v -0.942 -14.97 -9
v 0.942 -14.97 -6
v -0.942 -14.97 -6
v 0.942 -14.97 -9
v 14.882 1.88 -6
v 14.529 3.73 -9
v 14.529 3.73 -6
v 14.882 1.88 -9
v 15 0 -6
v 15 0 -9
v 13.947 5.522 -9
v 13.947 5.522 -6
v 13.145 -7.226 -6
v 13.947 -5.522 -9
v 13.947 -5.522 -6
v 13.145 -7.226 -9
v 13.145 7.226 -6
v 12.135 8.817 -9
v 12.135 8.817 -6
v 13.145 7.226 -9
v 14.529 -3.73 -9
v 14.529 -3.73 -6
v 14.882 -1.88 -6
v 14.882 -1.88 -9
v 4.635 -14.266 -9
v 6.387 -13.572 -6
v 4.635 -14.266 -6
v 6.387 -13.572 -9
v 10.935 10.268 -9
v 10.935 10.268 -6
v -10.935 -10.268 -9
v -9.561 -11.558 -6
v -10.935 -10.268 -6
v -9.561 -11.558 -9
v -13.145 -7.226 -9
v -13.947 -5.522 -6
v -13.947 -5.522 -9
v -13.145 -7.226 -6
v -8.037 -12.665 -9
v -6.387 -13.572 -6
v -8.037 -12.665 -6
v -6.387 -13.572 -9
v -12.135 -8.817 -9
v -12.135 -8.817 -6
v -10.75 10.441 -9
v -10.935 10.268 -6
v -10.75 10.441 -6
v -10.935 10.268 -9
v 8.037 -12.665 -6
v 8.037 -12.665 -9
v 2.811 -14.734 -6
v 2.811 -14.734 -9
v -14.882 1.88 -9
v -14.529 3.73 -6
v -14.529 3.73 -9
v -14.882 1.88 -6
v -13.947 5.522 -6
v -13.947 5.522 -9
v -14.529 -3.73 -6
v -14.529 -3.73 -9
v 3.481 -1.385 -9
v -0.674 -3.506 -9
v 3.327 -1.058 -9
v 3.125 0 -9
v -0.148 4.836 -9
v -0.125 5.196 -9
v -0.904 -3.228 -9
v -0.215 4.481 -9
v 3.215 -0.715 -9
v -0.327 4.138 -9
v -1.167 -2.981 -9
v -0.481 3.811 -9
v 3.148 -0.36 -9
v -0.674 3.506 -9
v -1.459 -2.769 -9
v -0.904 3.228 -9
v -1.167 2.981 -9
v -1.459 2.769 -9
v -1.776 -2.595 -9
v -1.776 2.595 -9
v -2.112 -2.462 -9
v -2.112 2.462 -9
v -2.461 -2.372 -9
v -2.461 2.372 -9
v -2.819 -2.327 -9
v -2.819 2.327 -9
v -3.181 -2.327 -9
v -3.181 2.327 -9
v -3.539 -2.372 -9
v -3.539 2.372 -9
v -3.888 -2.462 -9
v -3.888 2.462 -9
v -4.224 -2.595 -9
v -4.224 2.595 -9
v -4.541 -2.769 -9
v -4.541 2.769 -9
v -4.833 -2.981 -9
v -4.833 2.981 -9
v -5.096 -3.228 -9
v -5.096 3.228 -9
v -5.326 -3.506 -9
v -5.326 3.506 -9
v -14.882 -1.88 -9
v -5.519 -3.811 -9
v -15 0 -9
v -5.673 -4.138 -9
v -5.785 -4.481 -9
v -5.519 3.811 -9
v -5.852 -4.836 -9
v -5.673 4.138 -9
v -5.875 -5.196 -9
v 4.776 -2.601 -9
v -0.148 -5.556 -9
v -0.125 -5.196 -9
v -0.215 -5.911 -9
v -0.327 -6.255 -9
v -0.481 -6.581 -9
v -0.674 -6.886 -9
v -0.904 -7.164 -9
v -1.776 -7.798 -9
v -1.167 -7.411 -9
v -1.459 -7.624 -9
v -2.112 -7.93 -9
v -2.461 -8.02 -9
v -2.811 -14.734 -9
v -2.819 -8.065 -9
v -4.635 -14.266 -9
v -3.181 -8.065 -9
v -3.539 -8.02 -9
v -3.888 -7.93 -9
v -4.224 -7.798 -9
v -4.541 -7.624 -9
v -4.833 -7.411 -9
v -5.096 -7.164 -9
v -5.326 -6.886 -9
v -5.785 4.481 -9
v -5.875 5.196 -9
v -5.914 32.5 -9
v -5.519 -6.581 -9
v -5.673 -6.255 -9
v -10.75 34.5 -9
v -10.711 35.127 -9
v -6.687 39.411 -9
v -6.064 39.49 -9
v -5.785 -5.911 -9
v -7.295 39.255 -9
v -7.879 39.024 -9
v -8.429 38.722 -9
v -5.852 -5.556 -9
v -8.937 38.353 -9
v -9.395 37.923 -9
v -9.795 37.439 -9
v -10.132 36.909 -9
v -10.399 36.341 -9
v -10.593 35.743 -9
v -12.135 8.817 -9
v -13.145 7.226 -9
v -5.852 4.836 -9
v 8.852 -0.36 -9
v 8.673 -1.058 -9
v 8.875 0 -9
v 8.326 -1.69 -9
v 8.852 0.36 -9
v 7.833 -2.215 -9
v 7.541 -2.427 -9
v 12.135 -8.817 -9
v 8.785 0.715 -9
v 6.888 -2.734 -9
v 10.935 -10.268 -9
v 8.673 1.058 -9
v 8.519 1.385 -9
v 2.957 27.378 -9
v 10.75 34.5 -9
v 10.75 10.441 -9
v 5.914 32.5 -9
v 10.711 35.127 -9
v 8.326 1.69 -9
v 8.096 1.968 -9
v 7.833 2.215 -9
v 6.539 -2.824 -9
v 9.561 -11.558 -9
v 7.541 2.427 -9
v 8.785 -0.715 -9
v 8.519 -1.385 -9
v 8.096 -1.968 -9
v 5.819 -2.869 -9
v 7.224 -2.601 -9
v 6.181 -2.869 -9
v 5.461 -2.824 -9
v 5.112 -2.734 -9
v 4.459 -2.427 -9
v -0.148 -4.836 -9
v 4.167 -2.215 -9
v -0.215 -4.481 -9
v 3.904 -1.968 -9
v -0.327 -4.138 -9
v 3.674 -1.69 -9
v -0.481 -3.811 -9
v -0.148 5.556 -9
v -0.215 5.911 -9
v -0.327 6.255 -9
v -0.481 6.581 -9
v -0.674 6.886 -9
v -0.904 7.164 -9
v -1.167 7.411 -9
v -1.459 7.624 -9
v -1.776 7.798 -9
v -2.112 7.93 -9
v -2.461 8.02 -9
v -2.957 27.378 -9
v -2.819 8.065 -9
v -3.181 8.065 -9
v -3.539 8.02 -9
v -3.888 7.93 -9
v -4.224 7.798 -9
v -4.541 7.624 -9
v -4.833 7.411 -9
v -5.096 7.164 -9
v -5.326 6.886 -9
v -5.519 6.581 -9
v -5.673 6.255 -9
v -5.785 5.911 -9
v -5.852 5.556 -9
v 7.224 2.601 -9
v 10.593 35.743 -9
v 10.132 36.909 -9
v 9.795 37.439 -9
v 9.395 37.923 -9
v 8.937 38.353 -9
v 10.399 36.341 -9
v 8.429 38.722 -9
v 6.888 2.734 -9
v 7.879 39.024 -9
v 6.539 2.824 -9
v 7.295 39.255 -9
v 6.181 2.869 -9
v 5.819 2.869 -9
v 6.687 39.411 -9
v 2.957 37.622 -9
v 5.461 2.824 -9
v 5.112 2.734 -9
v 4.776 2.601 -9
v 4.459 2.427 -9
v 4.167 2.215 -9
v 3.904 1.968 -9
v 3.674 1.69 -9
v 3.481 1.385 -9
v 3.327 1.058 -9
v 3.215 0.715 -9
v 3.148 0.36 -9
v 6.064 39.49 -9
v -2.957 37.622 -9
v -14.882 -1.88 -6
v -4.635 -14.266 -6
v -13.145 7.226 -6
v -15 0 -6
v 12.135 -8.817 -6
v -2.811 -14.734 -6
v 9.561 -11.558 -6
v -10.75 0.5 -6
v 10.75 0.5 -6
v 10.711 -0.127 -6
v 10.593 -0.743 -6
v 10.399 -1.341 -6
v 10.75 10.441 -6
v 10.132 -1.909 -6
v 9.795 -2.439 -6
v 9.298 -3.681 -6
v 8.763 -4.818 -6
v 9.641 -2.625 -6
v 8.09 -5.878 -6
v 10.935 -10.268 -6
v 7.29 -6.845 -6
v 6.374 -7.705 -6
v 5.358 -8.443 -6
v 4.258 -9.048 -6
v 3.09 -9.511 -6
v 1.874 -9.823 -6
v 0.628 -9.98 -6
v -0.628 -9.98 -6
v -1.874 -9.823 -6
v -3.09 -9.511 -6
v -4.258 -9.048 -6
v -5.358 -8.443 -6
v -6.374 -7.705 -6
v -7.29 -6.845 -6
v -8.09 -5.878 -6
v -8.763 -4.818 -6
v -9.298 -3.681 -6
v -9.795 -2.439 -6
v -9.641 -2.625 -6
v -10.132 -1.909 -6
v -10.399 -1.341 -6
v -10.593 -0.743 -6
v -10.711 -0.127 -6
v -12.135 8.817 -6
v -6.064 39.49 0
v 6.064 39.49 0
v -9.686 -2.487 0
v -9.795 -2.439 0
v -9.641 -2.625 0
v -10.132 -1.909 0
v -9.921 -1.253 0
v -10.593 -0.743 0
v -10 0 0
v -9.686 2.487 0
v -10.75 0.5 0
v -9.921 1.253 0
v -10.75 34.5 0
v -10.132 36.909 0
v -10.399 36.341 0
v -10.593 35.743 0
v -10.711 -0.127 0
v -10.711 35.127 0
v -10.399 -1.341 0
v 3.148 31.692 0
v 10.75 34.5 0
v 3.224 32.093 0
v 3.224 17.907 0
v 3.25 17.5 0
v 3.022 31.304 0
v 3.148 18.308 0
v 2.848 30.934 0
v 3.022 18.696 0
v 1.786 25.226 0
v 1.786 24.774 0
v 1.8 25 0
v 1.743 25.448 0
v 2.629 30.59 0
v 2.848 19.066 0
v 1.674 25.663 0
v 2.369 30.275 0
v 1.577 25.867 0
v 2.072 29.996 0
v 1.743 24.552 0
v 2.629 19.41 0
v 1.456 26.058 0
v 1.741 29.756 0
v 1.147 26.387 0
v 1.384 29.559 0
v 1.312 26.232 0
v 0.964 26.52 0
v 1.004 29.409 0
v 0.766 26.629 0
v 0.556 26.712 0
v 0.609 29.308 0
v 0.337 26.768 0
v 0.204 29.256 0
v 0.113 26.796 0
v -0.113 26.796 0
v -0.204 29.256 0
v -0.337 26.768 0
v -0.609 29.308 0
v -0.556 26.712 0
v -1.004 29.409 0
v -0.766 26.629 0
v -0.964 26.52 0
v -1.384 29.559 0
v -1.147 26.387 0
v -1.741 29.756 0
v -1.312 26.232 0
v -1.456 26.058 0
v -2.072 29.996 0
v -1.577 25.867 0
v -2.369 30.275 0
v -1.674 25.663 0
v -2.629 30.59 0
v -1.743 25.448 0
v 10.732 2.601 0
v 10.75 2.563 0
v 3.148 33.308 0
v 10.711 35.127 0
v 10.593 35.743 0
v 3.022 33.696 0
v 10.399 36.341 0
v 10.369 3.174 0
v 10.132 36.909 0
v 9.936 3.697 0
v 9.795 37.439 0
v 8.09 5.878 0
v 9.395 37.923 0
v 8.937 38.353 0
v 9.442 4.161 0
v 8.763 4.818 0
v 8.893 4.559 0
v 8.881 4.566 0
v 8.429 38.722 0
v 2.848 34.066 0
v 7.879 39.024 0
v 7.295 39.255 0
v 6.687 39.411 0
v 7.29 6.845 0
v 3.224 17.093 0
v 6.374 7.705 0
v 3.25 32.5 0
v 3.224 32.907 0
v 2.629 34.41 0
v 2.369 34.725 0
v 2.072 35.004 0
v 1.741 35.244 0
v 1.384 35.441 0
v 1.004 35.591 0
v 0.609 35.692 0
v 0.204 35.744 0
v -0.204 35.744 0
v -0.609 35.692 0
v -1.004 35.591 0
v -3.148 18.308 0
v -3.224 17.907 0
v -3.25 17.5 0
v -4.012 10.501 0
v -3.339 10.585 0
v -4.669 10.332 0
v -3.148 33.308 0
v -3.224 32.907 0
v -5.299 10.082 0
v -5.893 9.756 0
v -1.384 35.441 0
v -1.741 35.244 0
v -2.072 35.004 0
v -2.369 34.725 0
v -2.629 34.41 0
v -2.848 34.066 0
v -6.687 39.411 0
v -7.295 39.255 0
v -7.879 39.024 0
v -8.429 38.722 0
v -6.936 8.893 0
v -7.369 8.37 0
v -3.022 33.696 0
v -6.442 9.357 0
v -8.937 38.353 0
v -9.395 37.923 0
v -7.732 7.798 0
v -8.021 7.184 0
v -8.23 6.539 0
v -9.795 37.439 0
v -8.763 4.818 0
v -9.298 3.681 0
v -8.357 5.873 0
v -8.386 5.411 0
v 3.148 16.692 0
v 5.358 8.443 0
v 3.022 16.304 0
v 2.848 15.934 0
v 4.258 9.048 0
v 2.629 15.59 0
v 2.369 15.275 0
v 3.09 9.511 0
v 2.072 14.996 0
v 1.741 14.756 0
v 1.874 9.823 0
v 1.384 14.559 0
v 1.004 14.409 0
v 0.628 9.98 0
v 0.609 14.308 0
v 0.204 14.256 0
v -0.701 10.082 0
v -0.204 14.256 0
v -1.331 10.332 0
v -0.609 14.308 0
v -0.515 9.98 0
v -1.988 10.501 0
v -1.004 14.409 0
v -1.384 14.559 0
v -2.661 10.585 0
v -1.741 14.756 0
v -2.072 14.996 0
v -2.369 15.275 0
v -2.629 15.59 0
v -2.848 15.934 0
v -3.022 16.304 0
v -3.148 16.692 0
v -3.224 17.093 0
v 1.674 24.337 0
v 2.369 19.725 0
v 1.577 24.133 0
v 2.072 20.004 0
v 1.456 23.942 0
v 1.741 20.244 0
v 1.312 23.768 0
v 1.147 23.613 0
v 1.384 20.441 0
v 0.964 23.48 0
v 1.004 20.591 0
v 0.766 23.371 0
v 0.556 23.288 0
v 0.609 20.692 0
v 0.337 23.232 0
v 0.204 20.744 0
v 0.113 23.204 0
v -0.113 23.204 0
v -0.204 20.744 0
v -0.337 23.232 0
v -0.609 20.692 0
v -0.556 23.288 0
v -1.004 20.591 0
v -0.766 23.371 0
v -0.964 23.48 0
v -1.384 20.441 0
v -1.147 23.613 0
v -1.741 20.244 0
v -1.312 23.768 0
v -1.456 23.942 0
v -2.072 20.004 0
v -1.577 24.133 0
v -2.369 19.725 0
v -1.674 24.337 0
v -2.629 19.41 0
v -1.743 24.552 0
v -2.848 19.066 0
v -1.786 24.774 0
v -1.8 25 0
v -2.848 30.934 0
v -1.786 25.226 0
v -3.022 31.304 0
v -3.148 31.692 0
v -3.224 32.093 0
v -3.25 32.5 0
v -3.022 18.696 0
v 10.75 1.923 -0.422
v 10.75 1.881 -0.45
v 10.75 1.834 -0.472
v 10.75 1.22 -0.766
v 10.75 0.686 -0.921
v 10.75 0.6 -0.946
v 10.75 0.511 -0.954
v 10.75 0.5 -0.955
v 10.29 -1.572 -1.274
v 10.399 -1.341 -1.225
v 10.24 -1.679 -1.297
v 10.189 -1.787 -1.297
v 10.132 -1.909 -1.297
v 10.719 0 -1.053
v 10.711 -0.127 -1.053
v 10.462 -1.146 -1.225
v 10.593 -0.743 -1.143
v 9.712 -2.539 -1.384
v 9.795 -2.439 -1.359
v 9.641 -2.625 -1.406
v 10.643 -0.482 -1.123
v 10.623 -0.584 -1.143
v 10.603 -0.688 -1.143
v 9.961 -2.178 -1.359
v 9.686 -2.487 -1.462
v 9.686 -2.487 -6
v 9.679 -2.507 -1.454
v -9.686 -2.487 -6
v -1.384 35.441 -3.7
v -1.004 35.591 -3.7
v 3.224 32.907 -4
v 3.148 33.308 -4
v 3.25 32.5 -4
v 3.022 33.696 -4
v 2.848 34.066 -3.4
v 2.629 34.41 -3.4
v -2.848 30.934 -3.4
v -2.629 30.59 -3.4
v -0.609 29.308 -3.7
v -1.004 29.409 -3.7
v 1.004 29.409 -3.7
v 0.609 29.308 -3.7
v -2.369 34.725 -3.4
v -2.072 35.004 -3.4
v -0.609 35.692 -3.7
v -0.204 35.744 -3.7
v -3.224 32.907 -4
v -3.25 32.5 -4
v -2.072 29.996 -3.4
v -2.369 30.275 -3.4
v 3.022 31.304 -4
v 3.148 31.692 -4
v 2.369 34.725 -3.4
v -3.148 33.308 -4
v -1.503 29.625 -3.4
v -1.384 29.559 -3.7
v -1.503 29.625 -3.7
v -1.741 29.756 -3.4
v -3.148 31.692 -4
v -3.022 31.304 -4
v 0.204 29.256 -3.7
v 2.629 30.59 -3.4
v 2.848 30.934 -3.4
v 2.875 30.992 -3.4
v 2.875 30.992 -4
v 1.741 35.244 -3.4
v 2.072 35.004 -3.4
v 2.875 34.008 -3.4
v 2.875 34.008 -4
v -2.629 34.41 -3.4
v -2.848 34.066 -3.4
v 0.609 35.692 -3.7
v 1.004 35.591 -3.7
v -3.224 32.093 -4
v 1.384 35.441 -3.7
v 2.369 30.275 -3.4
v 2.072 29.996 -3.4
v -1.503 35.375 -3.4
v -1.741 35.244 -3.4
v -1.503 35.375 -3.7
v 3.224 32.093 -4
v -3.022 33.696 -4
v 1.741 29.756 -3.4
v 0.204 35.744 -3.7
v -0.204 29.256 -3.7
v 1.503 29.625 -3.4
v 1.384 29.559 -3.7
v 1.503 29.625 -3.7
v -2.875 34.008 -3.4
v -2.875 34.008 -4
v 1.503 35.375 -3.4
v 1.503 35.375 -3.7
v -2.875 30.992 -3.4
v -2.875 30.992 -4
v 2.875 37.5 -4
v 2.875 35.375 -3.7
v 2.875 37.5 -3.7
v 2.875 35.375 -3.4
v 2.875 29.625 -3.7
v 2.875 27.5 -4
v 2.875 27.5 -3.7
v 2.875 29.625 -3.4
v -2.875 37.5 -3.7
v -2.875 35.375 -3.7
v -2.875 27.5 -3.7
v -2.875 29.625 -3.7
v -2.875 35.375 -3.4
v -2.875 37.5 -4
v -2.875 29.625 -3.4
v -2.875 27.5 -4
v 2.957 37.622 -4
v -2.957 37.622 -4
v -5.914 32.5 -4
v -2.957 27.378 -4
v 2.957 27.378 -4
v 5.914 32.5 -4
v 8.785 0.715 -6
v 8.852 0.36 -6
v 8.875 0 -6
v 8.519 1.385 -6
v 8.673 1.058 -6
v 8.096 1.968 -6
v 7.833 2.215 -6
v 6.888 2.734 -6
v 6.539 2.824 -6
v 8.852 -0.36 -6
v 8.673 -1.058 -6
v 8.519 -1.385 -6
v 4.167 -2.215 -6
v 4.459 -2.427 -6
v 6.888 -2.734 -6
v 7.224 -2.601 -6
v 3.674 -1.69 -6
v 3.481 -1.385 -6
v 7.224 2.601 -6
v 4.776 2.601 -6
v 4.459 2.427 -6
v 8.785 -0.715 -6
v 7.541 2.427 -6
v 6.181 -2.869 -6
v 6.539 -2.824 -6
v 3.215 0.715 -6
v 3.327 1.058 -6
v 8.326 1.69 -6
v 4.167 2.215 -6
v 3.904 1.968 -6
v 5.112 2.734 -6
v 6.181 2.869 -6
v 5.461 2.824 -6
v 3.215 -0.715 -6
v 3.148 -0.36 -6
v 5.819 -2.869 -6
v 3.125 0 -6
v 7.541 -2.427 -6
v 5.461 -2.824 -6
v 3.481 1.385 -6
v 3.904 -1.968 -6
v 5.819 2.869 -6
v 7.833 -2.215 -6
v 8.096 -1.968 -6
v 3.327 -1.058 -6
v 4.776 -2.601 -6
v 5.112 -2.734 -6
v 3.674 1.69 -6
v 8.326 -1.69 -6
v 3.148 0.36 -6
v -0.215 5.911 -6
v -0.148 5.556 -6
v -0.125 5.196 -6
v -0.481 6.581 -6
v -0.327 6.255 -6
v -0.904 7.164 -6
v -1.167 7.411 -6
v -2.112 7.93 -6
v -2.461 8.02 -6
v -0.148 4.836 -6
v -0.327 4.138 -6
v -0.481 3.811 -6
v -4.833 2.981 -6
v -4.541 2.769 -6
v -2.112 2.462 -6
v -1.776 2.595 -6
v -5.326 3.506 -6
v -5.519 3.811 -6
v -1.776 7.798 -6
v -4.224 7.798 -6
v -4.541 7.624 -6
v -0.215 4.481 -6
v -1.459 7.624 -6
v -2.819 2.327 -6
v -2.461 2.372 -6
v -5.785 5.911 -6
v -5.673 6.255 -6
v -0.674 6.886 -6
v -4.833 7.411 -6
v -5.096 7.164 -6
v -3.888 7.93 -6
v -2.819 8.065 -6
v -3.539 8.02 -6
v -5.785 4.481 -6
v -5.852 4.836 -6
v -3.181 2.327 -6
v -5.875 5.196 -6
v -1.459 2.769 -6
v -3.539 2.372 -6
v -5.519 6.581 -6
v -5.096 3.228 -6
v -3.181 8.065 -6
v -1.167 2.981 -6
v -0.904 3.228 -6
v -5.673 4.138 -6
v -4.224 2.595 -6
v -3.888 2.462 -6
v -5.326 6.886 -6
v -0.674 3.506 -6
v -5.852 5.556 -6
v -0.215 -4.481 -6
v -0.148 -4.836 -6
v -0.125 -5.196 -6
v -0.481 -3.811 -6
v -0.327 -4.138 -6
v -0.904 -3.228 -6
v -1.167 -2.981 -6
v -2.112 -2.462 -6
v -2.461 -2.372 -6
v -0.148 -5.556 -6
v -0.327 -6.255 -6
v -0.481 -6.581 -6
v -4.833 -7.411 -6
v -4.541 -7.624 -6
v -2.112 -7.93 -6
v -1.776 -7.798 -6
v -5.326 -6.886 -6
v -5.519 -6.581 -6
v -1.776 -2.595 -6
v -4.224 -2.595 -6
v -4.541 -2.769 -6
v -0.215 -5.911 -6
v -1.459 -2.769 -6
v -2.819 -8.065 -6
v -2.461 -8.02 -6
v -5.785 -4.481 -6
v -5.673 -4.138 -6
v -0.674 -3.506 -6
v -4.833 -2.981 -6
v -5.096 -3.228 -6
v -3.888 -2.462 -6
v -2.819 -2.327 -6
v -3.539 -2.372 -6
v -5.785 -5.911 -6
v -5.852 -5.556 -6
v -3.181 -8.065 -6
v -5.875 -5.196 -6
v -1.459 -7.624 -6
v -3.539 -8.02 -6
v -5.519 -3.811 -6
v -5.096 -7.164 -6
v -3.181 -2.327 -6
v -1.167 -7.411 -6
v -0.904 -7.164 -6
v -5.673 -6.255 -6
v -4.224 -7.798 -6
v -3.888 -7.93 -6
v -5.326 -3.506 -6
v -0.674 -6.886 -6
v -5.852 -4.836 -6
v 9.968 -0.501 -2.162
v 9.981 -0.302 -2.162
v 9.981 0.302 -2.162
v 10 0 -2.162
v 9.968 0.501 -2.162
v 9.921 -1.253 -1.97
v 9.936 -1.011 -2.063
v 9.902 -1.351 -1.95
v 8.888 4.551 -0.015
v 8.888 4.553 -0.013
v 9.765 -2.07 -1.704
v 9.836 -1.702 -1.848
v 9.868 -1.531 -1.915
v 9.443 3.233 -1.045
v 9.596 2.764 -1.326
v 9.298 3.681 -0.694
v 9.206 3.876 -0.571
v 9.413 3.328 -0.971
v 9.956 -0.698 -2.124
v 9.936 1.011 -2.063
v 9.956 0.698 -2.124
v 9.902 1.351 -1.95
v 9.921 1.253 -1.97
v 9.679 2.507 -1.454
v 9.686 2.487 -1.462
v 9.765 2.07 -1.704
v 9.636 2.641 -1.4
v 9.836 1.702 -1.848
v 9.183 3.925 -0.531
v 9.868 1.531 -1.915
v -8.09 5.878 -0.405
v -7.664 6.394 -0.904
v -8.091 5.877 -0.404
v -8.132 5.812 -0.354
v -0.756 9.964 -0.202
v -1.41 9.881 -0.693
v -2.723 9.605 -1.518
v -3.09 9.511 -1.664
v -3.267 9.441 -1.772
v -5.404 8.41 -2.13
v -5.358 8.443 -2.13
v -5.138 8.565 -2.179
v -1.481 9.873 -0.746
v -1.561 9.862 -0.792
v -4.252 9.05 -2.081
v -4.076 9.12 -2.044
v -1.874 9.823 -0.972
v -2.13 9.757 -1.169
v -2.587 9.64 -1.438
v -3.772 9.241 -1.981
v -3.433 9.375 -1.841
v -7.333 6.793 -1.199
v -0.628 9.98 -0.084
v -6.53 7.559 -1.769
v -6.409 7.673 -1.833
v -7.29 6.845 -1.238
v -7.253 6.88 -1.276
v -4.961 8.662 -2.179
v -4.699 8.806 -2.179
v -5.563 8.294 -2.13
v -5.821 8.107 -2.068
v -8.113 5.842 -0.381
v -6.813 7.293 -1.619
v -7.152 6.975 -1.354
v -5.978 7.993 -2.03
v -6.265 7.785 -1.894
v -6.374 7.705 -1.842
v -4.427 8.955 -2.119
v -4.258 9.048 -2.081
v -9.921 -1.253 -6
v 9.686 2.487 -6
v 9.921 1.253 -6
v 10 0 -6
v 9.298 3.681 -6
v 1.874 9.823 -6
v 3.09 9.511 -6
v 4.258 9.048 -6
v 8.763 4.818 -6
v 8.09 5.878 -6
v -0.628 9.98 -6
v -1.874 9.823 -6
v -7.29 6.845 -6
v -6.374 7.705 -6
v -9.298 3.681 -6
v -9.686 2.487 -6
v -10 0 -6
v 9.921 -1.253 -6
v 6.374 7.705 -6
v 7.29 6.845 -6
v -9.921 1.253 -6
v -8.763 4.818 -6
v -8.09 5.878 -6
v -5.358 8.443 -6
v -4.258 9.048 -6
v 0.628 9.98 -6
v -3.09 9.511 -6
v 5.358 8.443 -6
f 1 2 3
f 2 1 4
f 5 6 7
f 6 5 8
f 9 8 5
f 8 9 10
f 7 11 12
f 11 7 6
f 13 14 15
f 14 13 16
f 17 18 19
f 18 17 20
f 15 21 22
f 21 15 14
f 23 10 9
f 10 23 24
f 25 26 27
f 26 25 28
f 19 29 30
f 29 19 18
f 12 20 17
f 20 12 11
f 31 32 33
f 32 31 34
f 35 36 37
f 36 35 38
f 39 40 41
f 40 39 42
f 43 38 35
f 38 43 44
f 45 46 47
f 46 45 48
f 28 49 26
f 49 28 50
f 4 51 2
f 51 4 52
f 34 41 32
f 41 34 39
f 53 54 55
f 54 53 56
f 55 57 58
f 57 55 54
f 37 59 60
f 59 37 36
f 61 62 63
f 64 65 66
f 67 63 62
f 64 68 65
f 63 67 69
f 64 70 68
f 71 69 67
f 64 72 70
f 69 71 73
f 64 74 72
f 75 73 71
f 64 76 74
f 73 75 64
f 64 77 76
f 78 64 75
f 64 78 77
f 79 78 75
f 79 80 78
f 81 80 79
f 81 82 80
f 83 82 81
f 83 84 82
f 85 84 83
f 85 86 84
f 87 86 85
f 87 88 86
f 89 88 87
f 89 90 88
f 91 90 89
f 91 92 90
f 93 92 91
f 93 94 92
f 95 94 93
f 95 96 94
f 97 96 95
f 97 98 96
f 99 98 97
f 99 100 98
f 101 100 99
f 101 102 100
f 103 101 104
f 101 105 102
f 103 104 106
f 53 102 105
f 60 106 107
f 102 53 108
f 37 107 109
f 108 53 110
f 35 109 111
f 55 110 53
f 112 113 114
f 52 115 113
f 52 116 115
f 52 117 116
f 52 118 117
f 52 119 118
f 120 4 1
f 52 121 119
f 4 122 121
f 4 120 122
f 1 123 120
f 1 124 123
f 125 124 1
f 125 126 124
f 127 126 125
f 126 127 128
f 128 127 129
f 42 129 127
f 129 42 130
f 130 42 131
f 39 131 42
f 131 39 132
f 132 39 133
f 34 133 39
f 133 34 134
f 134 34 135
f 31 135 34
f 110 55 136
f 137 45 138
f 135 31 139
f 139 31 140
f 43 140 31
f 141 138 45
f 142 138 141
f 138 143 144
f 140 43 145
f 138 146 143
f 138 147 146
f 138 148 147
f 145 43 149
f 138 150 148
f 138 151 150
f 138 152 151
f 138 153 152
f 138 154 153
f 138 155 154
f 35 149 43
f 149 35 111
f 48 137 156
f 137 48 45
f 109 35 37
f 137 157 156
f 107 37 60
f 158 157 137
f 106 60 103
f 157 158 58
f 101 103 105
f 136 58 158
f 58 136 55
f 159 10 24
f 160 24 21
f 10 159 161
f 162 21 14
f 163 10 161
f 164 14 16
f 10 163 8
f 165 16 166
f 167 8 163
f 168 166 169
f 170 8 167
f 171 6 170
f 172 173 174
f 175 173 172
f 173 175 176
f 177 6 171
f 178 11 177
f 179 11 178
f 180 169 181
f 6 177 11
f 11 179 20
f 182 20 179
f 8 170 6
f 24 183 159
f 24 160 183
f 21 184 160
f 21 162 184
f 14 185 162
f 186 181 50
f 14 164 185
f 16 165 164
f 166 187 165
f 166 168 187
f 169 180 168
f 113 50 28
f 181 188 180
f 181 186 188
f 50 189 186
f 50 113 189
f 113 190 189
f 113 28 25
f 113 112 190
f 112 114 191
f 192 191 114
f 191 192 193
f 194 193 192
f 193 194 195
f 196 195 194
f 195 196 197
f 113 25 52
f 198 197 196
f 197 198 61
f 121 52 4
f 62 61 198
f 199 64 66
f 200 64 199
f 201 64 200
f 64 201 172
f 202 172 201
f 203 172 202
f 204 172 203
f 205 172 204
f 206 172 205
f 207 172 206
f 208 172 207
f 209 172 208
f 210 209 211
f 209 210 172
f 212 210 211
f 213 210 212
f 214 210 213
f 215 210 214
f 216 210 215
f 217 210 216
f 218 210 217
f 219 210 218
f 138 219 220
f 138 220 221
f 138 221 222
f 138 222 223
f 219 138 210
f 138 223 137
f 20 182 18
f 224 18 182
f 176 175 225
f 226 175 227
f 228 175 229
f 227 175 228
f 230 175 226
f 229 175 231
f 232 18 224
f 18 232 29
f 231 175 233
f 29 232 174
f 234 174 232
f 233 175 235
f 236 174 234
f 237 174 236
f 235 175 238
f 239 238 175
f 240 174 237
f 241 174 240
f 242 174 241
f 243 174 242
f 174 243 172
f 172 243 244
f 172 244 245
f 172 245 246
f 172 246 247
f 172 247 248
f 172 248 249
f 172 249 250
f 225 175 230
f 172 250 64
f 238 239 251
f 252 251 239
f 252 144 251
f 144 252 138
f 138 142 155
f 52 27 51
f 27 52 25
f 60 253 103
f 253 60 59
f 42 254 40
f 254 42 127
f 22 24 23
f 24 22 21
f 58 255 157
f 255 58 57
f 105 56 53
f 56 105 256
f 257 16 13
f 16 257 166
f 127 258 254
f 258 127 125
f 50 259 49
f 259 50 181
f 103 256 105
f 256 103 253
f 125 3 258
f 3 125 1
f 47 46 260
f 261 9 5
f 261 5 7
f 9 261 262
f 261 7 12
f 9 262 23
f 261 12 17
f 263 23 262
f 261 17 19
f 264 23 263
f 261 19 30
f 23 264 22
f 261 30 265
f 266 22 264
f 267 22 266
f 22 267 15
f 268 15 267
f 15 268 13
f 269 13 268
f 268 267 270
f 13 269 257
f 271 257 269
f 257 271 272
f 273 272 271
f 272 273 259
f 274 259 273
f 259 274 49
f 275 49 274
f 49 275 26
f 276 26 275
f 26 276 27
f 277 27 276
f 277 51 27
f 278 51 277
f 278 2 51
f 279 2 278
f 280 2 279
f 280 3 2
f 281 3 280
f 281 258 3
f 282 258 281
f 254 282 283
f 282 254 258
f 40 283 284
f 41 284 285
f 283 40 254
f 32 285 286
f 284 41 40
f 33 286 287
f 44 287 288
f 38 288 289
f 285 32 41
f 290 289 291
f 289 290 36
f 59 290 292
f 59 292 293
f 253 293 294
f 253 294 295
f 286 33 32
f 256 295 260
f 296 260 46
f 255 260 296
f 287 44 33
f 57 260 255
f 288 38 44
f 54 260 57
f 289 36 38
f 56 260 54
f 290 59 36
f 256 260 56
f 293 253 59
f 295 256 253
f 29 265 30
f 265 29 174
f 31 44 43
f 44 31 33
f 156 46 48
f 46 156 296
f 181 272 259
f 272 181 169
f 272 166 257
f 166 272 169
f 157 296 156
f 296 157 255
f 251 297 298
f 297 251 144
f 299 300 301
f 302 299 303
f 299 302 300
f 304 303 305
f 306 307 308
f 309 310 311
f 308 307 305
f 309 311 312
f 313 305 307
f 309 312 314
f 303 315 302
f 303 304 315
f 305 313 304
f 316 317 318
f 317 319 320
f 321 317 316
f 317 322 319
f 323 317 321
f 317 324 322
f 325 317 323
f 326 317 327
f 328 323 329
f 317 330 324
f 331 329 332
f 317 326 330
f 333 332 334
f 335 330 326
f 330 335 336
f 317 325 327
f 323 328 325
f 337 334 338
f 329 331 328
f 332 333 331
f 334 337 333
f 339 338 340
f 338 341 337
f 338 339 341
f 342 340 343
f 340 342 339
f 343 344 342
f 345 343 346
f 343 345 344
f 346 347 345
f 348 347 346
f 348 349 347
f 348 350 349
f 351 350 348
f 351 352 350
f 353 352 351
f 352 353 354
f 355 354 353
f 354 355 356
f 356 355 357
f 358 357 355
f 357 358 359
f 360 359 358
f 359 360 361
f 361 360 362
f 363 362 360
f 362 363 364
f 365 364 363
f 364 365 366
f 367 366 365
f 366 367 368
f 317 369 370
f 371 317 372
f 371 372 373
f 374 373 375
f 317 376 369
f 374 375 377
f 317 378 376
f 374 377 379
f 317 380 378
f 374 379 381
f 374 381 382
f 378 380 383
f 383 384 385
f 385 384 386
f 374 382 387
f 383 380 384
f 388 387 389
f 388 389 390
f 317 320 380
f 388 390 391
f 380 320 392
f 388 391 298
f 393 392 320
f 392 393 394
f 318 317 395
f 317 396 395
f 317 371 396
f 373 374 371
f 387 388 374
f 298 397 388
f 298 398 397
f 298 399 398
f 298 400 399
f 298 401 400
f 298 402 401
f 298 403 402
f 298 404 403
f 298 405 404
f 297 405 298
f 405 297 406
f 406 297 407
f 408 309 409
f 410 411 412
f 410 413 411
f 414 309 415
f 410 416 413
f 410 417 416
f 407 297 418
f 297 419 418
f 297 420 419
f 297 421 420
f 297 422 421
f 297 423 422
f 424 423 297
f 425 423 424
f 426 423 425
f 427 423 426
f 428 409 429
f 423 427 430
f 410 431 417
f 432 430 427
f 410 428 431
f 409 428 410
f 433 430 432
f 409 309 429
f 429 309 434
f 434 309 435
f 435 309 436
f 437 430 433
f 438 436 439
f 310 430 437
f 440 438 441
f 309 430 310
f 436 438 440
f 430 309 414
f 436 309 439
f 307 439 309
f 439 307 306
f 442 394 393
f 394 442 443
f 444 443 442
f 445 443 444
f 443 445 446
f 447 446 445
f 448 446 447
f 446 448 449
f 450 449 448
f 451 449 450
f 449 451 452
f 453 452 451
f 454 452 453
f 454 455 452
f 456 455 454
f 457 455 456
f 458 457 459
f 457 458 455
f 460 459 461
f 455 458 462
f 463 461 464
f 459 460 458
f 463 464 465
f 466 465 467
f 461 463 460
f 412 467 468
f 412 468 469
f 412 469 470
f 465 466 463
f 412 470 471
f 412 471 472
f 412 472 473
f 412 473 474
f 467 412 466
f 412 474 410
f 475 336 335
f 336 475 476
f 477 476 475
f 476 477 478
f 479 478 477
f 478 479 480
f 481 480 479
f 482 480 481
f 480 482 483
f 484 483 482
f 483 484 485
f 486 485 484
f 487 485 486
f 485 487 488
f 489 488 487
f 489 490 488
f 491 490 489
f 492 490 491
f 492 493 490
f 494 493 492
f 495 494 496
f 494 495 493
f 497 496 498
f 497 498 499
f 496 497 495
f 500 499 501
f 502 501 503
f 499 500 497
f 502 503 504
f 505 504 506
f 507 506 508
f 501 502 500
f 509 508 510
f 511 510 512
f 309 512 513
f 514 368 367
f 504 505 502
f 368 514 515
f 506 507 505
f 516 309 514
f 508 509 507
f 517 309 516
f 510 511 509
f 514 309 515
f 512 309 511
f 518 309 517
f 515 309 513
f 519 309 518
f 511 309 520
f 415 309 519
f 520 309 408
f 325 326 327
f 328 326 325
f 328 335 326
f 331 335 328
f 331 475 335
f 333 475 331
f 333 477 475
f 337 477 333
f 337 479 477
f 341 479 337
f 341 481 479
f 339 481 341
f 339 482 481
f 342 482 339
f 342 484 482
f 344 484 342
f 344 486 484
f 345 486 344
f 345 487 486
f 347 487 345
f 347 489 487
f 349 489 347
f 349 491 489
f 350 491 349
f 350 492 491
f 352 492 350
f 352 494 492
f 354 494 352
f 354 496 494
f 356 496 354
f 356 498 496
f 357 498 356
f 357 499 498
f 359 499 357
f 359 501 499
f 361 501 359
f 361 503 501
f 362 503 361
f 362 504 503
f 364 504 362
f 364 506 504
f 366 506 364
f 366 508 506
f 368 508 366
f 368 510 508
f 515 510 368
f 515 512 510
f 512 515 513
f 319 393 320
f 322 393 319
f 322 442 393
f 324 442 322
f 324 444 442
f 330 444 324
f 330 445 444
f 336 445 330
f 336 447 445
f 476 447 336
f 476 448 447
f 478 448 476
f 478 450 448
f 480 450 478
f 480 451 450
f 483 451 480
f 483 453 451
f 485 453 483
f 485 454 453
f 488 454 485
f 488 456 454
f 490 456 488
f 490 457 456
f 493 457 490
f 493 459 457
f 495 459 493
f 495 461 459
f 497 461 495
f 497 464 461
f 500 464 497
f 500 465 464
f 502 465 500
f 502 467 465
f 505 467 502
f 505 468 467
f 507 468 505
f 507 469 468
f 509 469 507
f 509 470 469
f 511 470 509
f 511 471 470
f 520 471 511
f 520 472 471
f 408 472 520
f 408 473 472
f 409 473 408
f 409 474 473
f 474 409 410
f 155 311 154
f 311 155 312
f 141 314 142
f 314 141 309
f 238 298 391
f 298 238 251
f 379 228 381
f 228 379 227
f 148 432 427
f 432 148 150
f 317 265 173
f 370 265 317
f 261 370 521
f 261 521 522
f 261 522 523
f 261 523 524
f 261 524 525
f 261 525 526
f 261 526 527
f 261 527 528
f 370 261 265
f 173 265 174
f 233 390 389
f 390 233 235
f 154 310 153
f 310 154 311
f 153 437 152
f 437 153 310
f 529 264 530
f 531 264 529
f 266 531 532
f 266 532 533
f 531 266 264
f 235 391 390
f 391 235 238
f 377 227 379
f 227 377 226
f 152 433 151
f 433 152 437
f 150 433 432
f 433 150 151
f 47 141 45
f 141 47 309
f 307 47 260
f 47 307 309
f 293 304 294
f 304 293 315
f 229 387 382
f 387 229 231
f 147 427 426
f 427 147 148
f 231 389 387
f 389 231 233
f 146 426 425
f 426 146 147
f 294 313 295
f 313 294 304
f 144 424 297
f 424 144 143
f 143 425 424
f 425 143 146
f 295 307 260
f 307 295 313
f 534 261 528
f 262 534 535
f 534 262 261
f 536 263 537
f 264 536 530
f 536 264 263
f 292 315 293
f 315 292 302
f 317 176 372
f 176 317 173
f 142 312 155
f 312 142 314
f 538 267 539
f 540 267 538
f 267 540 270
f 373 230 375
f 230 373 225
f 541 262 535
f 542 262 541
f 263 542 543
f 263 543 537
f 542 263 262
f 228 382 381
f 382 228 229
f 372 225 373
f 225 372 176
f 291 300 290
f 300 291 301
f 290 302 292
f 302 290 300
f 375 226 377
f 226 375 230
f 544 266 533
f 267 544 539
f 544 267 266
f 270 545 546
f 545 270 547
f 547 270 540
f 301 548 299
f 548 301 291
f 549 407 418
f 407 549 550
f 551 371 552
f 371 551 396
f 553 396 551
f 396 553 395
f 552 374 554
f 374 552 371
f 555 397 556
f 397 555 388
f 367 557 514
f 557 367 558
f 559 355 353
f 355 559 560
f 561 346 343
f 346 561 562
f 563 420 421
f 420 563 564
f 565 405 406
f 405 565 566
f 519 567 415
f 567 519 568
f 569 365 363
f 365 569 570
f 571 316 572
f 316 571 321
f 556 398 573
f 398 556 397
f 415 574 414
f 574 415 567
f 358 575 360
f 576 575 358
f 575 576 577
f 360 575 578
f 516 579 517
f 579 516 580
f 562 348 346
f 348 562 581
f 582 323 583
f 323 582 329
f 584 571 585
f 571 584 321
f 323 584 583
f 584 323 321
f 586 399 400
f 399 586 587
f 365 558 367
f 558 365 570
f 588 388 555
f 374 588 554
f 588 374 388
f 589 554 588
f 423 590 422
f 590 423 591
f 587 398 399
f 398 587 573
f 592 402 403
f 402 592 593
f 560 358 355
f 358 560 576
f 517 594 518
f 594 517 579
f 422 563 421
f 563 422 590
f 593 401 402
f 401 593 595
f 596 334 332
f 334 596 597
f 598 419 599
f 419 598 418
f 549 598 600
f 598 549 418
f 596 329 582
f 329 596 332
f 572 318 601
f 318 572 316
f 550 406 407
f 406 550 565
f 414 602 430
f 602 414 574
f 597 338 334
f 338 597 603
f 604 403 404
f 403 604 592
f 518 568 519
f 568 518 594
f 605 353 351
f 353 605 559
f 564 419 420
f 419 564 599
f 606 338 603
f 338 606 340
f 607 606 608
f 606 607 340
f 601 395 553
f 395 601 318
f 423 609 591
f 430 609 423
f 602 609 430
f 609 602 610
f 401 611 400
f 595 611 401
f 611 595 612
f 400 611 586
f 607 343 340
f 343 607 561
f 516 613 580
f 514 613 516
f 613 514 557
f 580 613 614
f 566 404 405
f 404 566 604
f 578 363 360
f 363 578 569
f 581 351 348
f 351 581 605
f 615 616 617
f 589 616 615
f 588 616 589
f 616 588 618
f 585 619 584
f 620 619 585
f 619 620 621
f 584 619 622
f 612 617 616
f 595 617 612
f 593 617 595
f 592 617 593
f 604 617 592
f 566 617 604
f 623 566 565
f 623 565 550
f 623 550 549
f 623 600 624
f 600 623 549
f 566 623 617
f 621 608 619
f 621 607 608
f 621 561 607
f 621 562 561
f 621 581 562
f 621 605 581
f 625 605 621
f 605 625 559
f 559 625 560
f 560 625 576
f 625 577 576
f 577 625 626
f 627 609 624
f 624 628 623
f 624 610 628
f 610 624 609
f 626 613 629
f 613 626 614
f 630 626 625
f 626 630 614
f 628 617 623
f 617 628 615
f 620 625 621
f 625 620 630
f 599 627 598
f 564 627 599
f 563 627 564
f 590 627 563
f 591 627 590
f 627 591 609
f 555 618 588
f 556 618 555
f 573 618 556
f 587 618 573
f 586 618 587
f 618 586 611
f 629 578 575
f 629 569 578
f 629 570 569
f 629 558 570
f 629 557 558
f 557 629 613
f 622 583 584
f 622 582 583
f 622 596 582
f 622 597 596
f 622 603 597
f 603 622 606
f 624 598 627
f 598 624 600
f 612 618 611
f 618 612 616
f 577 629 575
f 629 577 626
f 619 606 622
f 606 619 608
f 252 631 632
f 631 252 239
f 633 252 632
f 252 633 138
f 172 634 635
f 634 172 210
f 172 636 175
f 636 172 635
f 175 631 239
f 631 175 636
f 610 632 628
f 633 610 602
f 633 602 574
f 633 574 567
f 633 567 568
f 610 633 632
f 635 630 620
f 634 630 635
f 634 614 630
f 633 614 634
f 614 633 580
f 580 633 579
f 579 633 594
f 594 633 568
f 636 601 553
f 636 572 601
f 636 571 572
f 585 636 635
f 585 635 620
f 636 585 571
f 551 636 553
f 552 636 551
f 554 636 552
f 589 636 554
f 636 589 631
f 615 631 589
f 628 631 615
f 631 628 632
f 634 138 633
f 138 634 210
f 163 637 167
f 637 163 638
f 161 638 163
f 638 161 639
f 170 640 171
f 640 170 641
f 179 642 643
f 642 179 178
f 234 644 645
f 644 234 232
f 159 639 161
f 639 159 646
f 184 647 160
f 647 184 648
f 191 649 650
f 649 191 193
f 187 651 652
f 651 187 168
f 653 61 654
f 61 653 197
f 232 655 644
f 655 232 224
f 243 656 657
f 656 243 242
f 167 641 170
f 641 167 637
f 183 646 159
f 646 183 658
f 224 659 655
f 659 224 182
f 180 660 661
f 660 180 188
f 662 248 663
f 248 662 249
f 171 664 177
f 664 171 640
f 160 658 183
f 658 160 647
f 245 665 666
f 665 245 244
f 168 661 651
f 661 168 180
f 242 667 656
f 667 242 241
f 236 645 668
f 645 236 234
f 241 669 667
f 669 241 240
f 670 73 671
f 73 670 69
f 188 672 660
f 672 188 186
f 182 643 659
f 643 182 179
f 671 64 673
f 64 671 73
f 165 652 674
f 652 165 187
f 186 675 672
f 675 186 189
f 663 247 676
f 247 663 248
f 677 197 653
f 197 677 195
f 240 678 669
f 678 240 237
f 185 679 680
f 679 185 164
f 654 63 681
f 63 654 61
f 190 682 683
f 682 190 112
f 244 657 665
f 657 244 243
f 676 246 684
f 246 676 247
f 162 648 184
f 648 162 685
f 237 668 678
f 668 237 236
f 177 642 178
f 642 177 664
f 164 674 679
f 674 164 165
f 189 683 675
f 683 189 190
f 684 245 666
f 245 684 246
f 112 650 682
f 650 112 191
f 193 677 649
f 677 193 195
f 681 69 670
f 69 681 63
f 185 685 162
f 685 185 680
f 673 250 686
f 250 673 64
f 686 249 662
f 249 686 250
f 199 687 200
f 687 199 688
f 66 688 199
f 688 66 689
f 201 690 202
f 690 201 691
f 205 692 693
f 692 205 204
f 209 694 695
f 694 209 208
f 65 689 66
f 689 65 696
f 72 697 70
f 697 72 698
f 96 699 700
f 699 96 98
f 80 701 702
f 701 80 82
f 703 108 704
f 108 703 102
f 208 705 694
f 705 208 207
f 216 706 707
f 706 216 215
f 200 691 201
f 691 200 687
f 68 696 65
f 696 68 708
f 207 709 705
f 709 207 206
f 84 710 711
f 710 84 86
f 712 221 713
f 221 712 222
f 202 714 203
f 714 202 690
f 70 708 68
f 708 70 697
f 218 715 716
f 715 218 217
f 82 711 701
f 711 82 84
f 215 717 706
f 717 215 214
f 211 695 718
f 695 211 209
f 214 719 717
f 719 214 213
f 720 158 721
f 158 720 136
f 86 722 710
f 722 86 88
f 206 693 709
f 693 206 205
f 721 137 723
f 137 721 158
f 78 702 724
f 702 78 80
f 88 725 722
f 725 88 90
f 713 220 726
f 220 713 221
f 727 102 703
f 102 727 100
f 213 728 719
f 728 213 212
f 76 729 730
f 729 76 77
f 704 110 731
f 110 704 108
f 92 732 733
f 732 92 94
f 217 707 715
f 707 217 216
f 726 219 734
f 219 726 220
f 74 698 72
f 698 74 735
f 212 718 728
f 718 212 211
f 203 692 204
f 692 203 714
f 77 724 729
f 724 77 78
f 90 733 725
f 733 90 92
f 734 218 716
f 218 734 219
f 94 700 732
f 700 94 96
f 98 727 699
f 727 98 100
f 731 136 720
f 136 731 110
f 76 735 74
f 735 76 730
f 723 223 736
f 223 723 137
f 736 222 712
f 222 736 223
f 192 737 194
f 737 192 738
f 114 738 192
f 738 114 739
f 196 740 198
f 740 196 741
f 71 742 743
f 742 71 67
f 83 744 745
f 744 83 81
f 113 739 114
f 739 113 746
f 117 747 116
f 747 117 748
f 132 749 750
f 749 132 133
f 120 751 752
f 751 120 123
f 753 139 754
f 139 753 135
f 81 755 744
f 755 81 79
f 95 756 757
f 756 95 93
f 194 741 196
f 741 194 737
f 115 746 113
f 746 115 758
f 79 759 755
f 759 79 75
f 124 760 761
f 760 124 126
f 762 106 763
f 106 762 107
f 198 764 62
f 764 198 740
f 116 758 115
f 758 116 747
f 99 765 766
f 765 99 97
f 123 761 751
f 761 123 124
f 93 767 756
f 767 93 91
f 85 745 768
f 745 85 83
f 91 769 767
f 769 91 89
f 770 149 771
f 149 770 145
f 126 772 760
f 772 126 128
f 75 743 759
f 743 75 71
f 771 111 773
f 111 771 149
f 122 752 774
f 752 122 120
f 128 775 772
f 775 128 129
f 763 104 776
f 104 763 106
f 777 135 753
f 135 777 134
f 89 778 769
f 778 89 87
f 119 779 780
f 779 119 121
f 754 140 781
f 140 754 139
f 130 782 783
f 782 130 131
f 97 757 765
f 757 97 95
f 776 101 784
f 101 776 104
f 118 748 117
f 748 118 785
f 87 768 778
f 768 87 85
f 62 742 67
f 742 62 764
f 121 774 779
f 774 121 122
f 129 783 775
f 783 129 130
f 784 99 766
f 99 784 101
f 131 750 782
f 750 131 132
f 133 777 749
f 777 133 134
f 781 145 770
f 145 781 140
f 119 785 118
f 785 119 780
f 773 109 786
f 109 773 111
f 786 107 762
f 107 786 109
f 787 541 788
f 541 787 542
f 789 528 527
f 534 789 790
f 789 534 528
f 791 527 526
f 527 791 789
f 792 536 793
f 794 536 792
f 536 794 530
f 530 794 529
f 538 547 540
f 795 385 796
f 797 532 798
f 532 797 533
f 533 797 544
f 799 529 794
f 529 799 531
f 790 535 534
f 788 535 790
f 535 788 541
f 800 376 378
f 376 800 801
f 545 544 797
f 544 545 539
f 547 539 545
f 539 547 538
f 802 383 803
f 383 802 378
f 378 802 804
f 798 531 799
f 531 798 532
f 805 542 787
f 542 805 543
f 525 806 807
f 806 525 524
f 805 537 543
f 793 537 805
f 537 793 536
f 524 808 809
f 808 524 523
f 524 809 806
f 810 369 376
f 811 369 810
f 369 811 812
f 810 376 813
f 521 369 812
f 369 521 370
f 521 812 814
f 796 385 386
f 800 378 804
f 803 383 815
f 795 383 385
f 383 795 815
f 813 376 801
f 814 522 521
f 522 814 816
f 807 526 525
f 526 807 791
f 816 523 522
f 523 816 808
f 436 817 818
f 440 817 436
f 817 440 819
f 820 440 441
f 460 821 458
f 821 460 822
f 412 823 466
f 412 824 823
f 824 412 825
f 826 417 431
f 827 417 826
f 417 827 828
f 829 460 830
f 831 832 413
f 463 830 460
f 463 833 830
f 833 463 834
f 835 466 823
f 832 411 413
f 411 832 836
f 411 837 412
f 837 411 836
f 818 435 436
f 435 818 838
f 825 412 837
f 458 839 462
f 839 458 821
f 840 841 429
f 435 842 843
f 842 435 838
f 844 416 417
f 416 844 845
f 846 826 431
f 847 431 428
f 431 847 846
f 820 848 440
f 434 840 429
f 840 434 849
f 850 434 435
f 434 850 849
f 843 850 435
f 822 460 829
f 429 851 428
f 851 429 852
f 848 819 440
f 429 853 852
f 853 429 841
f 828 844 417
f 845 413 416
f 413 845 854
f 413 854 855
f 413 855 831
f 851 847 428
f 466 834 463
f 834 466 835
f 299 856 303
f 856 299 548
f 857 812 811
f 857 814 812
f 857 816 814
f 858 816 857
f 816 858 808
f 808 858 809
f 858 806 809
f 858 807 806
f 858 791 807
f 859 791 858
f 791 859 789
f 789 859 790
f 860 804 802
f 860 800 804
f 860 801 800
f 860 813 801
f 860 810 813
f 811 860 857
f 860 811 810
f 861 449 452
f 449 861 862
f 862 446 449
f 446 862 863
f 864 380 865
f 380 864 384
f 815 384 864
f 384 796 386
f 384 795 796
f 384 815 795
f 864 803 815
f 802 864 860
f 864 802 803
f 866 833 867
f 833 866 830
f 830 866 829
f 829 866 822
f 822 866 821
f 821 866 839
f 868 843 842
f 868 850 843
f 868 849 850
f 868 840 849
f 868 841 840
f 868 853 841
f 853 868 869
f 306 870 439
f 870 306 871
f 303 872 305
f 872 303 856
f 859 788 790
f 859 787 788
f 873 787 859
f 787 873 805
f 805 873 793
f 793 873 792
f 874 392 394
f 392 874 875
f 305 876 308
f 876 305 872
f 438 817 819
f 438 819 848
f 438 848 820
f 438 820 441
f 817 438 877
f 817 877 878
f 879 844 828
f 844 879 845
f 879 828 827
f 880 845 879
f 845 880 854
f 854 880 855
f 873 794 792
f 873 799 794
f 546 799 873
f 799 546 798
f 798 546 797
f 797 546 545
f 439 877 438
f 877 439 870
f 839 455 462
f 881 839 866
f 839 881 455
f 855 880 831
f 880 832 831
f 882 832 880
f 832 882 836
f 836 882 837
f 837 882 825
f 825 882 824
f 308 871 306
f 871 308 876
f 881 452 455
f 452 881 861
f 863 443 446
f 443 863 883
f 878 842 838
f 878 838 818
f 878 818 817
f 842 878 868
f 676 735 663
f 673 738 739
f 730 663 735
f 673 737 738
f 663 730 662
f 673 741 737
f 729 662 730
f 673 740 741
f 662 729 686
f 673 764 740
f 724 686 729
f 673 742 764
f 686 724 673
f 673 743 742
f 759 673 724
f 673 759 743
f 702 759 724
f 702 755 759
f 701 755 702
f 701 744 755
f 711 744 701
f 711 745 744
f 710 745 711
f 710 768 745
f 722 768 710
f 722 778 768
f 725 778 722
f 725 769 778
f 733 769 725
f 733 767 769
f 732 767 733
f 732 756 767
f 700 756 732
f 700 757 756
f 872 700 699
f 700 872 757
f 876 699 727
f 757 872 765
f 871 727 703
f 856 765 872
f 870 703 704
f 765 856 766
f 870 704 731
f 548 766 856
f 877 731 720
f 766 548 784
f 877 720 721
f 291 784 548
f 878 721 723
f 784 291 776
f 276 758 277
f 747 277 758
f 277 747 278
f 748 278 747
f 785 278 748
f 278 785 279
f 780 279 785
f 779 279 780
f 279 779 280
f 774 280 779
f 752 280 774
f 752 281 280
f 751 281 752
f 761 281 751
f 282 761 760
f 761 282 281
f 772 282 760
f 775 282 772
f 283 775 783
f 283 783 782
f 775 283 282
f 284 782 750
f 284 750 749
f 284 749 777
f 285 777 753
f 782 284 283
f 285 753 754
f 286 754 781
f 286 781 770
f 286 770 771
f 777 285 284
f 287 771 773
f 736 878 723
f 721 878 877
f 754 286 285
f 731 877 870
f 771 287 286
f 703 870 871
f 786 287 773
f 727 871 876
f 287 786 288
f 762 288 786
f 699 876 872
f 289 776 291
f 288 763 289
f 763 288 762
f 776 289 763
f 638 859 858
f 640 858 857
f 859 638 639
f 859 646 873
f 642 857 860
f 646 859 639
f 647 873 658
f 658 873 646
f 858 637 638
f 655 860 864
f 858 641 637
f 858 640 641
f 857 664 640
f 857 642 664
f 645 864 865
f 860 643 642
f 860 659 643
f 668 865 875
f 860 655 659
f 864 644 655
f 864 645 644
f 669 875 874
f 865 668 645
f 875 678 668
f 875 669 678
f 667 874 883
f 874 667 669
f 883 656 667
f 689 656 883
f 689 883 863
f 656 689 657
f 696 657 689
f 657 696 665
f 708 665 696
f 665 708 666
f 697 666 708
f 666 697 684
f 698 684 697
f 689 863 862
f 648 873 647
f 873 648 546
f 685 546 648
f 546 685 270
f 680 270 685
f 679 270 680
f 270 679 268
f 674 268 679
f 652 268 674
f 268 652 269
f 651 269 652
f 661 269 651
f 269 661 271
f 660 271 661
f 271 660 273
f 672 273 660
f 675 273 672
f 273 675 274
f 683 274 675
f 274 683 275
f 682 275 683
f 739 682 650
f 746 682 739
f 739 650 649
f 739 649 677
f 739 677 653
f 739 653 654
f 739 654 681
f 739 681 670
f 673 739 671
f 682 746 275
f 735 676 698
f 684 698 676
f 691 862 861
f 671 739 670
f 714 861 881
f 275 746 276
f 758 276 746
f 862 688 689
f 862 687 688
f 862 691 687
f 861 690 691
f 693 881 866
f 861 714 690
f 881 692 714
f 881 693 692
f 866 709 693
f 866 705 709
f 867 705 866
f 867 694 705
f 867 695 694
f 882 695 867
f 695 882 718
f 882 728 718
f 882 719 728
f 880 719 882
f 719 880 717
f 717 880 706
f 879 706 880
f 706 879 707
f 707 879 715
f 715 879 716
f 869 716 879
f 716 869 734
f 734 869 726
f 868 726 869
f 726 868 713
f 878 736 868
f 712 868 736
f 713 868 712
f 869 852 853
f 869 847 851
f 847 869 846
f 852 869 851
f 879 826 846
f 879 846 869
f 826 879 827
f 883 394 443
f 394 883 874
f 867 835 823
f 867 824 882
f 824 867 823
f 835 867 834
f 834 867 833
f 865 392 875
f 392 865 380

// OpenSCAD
$fn = 50;


difference() {
	union() {
		translate(v = [0, 0, -9.0000000000]) {
			cylinder(h = 3, r = 15.0000000000);
		}
		translate(v = [0, 17.5000000000, -9]) {
			hull() {
				translate(v = [-2.0000000000, 17.0000000000, 0]) {
					cylinder(h = 9, r = 5);
				}
				translate(v = [2.0000000000, 17.0000000000, 0]) {
					cylinder(h = 9, r = 5);
				}
				translate(v = [-2.0000000000, -17.0000000000, 0]) {
					cylinder(h = 9, r = 5);
				}
				translate(v = [2.0000000000, -17.0000000000, 0]) {
					cylinder(h = 9, r = 5);
				}
			}
		}
		translate(v = [0, 17.5000000000, -9]) {
			hull() {
				translate(v = [-5.7500000000, 17.0000000000, 0]) {
					cylinder(h = 9, r = 5);
				}
				translate(v = [5.7500000000, 17.0000000000, 0]) {
					cylinder(h = 9, r = 5);
				}
				translate(v = [-5.7500000000, -17.0000000000, 0]) {
					cylinder(h = 9, r = 5);
				}
				translate(v = [5.7500000000, -17.0000000000, 0]) {
					cylinder(h = 9, r = 5);
				}
			}
		}
		translate(v = [0, 0, -9.0000000000]) {
			cylinder(h = 9, r = 10.0000000000);
		}
	}
	union() {
		translate(v = [0, 32.5000000000, 0]) {
			rotate(a = [0, 0, 0]) {
				difference() {
					union() {
						translate(v = [0, 0, -50.0000000000]) {
							cylinder(h = 100, r = 3.2500000000);
						}
					}
					union();
				}
			}
		}
		translate(v = [0, 32.5000000000, -9]) {
			rotate(a = [0, 0, 0]) {
				difference() {
					union() {
						translate(v = [-2.8750000000, -5.0000000000, -0.3000000000]) {
							cube(size = [5.7500000000, 10, 0.3000000000]);
						}
						translate(v = [-2.8750000000, -2.8750000000, -0.6000000000]) {
							cube(size = [5.7500000000, 5.7500000000, 0.3000000000]);
						}
						translate(v = [-2.8750000000, -5.0000000000, 5]) {
							cube(size = [5.7500000000, 10, 0.3000000000]);
						}
						translate(v = [-2.8750000000, -2.8750000000, 5.3000000000]) {
							cube(size = [5.7500000000, 5.7500000000, 0.3000000000]);
						}
						linear_extrude(height = 5) {
							polygon(points = [[5.9142500000, 0.0000000000], [2.9571250000, 5.1218907443], [-2.9571250000, 5.1218907443], [-5.9142500000, 0.0000000000], [-2.9571250000, -5.1218907443], [2.9571250000, -5.1218907443]]);
						}
						translate(v = [-2.8750000000, -5.0000000000, -0.3000000000]) {
							cube(size = [5.7500000000, 10, 0.3000000000]);
						}
						translate(v = [-2.8750000000, -2.8750000000, -0.6000000000]) {
							cube(size = [5.7500000000, 5.7500000000, 0.3000000000]);
						}
						translate(v = [-2.8750000000, -5.0000000000, 5]) {
							cube(size = [5.7500000000, 10, 0.3000000000]);
						}
						translate(v = [-2.8750000000, -2.8750000000, 5.3000000000]) {
							cube(size = [5.7500000000, 5.7500000000, 0.3000000000]);
						}
						translate(v = [-2.8750000000, -5.0000000000, -0.3000000000]) {
							cube(size = [5.7500000000, 10, 0.3000000000]);
						}
						translate(v = [-2.8750000000, -2.8750000000, -0.6000000000]) {
							cube(size = [5.7500000000, 5.7500000000, 0.3000000000]);
						}
						translate(v = [-2.8750000000, -5.0000000000, 5]) {
							cube(size = [5.7500000000, 10, 0.3000000000]);
						}
						translate(v = [-2.8750000000, -2.8750000000, 5.3000000000]) {
							cube(size = [5.7500000000, 5.7500000000, 0.3000000000]);
						}
					}
					union();
				}
			}
		}
		translate(v = [6.0000000000, 0.0000000000, 41]) {
			rotate(a = [0, 0, 0]) {
				difference() {
					union() {
						translate(v = [0, 0, -59.0000000000]) {
							cylinder(h = 59, r = 2.6000000000);
						}
						translate(v = [0, 0, -3.9000000000]) {
							cylinder(h = 3.9000000000, r1 = 2.8750000000, r2 = 5.4000000000);
						}
						translate(v = [0, 0, -59.0000000000]) {
							cylinder(h = 59, r = 2.8750000000);
						}
						translate(v = [0, 0, -59.0000000000]) {
							cylinder(h = 59, r = 2.6000000000);
						}
					}
					union();
				}
			}
		}
		translate(v = [-3.0000000000, 5.1961524227, 41]) {
			rotate(a = [0, 0, 0]) {
				difference() {
					union() {
						translate(v = [0, 0, -59.0000000000]) {
							cylinder(h = 59, r = 2.6000000000);
						}
						translate(v = [0, 0, -3.9000000000]) {
							cylinder(h = 3.9000000000, r1 = 2.8750000000, r2 = 5.4000000000);
						}
						translate(v = [0, 0, -59.0000000000]) {
							cylinder(h = 59, r = 2.8750000000);
						}
						translate(v = [0, 0, -59.0000000000]) {
							cylinder(h = 59, r = 2.6000000000);
						}
					}
					union();
				}
			}
		}
		translate(v = [-3.0000000000, -5.1961524227, 41]) {
			rotate(a = [0, 0, 0]) {
				difference() {
					union() {
						translate(v = [0, 0, -59.0000000000]) {
							cylinder(h = 59, r = 2.6000000000);
						}
						translate(v = [0, 0, -3.9000000000]) {
							cylinder(h = 3.9000000000, r1 = 2.8750000000, r2 = 5.4000000000);
						}
						translate(v = [0, 0, -59.0000000000]) {
							cylinder(h = 59, r = 2.8750000000);
						}
						translate(v = [0, 0, -59.0000000000]) {
							cylinder(h = 59, r = 2.6000000000);
						}
					}
					union();
				}
			}
		}
		translate(v = [6.0000000000, 0.0000000000, 0]) {
			rotate(a = [0, 0, 0]) {
				difference() {
					union() {
						#translate(v = [0, 0, -9.0000000000]) {
							cylinder(h = 9, r = 2.6000000000);
						}
						#translate(v = [0, 0, -3.9000000000]) {
							cylinder(h = 3.9000000000, r = 10.0000000000, r1 = 2.8750000000, r2 = 5.4000000000);
						}
						#translate(v = [0, 0, -9.0000000000]) {
							cylinder(h = 9, r = 2.8750000000);
						}
						#translate(v = [0, 0, -9.0000000000]) {
							cylinder(h = 9, r = 2.6000000000);
						}
					}
					union();
				}
			}
		}
		translate(v = [-3.0000000000, 5.1961524227, 0]) {
			rotate(a = [0, 0, 0]) {
				difference() {
					union() {
						#translate(v = [0, 0, -9.0000000000]) {
							cylinder(h = 9, r = 2.6000000000);
						}
						#translate(v = [0, 0, -3.9000000000]) {
							cylinder(h = 3.9000000000, r = 10.0000000000, r1 = 2.8750000000, r2 = 5.4000000000);
						}
						#translate(v = [0, 0, -9.0000000000]) {
							cylinder(h = 9, r = 2.8750000000);
						}
						#translate(v = [0, 0, -9.0000000000]) {
							cylinder(h = 9, r = 2.6000000000);
						}
					}
					union();
				}
			}
		}
		translate(v = [-3.0000000000, -5.1961524227, 0]) {
			rotate(a = [0, 0, 0]) {
				difference() {
					union() {
						#translate(v = [0, 0, -9.0000000000]) {
							cylinder(h = 9, r = 2.6000000000);
						}
						#translate(v = [0, 0, -3.9000000000]) {
							cylinder(h = 3.9000000000, r = 10.0000000000, r1 = 2.8750000000, r2 = 5.4000000000);
						}
						#translate(v = [0, 0, -9.0000000000]) {
							cylinder(h = 9, r = 2.8750000000);
						}
						#translate(v = [0, 0, -9.0000000000]) {
							cylinder(h = 9, r = 2.6000000000);
						}
					}
					union();
				}
			}
		}
		translate(v = [0, 0, -6.0000000000]) {
			cylinder(h = 100, r = 10.0000000000);
		}
		translate(v = [0.0000000000, 32.5000000000, 0]) {
			cylinder(h = 9, r = 3.2500000000);
		}
		translate(v = [0.0000000000, 17.5000000000, 0]) {
			cylinder(h = 9, r = 3.2500000000);
		}
		translate(v = [0.0000000000, 25.0000000000, 0]) {
			cylinder(h = 9, r = 1.8000000000);
		}
	}
}
